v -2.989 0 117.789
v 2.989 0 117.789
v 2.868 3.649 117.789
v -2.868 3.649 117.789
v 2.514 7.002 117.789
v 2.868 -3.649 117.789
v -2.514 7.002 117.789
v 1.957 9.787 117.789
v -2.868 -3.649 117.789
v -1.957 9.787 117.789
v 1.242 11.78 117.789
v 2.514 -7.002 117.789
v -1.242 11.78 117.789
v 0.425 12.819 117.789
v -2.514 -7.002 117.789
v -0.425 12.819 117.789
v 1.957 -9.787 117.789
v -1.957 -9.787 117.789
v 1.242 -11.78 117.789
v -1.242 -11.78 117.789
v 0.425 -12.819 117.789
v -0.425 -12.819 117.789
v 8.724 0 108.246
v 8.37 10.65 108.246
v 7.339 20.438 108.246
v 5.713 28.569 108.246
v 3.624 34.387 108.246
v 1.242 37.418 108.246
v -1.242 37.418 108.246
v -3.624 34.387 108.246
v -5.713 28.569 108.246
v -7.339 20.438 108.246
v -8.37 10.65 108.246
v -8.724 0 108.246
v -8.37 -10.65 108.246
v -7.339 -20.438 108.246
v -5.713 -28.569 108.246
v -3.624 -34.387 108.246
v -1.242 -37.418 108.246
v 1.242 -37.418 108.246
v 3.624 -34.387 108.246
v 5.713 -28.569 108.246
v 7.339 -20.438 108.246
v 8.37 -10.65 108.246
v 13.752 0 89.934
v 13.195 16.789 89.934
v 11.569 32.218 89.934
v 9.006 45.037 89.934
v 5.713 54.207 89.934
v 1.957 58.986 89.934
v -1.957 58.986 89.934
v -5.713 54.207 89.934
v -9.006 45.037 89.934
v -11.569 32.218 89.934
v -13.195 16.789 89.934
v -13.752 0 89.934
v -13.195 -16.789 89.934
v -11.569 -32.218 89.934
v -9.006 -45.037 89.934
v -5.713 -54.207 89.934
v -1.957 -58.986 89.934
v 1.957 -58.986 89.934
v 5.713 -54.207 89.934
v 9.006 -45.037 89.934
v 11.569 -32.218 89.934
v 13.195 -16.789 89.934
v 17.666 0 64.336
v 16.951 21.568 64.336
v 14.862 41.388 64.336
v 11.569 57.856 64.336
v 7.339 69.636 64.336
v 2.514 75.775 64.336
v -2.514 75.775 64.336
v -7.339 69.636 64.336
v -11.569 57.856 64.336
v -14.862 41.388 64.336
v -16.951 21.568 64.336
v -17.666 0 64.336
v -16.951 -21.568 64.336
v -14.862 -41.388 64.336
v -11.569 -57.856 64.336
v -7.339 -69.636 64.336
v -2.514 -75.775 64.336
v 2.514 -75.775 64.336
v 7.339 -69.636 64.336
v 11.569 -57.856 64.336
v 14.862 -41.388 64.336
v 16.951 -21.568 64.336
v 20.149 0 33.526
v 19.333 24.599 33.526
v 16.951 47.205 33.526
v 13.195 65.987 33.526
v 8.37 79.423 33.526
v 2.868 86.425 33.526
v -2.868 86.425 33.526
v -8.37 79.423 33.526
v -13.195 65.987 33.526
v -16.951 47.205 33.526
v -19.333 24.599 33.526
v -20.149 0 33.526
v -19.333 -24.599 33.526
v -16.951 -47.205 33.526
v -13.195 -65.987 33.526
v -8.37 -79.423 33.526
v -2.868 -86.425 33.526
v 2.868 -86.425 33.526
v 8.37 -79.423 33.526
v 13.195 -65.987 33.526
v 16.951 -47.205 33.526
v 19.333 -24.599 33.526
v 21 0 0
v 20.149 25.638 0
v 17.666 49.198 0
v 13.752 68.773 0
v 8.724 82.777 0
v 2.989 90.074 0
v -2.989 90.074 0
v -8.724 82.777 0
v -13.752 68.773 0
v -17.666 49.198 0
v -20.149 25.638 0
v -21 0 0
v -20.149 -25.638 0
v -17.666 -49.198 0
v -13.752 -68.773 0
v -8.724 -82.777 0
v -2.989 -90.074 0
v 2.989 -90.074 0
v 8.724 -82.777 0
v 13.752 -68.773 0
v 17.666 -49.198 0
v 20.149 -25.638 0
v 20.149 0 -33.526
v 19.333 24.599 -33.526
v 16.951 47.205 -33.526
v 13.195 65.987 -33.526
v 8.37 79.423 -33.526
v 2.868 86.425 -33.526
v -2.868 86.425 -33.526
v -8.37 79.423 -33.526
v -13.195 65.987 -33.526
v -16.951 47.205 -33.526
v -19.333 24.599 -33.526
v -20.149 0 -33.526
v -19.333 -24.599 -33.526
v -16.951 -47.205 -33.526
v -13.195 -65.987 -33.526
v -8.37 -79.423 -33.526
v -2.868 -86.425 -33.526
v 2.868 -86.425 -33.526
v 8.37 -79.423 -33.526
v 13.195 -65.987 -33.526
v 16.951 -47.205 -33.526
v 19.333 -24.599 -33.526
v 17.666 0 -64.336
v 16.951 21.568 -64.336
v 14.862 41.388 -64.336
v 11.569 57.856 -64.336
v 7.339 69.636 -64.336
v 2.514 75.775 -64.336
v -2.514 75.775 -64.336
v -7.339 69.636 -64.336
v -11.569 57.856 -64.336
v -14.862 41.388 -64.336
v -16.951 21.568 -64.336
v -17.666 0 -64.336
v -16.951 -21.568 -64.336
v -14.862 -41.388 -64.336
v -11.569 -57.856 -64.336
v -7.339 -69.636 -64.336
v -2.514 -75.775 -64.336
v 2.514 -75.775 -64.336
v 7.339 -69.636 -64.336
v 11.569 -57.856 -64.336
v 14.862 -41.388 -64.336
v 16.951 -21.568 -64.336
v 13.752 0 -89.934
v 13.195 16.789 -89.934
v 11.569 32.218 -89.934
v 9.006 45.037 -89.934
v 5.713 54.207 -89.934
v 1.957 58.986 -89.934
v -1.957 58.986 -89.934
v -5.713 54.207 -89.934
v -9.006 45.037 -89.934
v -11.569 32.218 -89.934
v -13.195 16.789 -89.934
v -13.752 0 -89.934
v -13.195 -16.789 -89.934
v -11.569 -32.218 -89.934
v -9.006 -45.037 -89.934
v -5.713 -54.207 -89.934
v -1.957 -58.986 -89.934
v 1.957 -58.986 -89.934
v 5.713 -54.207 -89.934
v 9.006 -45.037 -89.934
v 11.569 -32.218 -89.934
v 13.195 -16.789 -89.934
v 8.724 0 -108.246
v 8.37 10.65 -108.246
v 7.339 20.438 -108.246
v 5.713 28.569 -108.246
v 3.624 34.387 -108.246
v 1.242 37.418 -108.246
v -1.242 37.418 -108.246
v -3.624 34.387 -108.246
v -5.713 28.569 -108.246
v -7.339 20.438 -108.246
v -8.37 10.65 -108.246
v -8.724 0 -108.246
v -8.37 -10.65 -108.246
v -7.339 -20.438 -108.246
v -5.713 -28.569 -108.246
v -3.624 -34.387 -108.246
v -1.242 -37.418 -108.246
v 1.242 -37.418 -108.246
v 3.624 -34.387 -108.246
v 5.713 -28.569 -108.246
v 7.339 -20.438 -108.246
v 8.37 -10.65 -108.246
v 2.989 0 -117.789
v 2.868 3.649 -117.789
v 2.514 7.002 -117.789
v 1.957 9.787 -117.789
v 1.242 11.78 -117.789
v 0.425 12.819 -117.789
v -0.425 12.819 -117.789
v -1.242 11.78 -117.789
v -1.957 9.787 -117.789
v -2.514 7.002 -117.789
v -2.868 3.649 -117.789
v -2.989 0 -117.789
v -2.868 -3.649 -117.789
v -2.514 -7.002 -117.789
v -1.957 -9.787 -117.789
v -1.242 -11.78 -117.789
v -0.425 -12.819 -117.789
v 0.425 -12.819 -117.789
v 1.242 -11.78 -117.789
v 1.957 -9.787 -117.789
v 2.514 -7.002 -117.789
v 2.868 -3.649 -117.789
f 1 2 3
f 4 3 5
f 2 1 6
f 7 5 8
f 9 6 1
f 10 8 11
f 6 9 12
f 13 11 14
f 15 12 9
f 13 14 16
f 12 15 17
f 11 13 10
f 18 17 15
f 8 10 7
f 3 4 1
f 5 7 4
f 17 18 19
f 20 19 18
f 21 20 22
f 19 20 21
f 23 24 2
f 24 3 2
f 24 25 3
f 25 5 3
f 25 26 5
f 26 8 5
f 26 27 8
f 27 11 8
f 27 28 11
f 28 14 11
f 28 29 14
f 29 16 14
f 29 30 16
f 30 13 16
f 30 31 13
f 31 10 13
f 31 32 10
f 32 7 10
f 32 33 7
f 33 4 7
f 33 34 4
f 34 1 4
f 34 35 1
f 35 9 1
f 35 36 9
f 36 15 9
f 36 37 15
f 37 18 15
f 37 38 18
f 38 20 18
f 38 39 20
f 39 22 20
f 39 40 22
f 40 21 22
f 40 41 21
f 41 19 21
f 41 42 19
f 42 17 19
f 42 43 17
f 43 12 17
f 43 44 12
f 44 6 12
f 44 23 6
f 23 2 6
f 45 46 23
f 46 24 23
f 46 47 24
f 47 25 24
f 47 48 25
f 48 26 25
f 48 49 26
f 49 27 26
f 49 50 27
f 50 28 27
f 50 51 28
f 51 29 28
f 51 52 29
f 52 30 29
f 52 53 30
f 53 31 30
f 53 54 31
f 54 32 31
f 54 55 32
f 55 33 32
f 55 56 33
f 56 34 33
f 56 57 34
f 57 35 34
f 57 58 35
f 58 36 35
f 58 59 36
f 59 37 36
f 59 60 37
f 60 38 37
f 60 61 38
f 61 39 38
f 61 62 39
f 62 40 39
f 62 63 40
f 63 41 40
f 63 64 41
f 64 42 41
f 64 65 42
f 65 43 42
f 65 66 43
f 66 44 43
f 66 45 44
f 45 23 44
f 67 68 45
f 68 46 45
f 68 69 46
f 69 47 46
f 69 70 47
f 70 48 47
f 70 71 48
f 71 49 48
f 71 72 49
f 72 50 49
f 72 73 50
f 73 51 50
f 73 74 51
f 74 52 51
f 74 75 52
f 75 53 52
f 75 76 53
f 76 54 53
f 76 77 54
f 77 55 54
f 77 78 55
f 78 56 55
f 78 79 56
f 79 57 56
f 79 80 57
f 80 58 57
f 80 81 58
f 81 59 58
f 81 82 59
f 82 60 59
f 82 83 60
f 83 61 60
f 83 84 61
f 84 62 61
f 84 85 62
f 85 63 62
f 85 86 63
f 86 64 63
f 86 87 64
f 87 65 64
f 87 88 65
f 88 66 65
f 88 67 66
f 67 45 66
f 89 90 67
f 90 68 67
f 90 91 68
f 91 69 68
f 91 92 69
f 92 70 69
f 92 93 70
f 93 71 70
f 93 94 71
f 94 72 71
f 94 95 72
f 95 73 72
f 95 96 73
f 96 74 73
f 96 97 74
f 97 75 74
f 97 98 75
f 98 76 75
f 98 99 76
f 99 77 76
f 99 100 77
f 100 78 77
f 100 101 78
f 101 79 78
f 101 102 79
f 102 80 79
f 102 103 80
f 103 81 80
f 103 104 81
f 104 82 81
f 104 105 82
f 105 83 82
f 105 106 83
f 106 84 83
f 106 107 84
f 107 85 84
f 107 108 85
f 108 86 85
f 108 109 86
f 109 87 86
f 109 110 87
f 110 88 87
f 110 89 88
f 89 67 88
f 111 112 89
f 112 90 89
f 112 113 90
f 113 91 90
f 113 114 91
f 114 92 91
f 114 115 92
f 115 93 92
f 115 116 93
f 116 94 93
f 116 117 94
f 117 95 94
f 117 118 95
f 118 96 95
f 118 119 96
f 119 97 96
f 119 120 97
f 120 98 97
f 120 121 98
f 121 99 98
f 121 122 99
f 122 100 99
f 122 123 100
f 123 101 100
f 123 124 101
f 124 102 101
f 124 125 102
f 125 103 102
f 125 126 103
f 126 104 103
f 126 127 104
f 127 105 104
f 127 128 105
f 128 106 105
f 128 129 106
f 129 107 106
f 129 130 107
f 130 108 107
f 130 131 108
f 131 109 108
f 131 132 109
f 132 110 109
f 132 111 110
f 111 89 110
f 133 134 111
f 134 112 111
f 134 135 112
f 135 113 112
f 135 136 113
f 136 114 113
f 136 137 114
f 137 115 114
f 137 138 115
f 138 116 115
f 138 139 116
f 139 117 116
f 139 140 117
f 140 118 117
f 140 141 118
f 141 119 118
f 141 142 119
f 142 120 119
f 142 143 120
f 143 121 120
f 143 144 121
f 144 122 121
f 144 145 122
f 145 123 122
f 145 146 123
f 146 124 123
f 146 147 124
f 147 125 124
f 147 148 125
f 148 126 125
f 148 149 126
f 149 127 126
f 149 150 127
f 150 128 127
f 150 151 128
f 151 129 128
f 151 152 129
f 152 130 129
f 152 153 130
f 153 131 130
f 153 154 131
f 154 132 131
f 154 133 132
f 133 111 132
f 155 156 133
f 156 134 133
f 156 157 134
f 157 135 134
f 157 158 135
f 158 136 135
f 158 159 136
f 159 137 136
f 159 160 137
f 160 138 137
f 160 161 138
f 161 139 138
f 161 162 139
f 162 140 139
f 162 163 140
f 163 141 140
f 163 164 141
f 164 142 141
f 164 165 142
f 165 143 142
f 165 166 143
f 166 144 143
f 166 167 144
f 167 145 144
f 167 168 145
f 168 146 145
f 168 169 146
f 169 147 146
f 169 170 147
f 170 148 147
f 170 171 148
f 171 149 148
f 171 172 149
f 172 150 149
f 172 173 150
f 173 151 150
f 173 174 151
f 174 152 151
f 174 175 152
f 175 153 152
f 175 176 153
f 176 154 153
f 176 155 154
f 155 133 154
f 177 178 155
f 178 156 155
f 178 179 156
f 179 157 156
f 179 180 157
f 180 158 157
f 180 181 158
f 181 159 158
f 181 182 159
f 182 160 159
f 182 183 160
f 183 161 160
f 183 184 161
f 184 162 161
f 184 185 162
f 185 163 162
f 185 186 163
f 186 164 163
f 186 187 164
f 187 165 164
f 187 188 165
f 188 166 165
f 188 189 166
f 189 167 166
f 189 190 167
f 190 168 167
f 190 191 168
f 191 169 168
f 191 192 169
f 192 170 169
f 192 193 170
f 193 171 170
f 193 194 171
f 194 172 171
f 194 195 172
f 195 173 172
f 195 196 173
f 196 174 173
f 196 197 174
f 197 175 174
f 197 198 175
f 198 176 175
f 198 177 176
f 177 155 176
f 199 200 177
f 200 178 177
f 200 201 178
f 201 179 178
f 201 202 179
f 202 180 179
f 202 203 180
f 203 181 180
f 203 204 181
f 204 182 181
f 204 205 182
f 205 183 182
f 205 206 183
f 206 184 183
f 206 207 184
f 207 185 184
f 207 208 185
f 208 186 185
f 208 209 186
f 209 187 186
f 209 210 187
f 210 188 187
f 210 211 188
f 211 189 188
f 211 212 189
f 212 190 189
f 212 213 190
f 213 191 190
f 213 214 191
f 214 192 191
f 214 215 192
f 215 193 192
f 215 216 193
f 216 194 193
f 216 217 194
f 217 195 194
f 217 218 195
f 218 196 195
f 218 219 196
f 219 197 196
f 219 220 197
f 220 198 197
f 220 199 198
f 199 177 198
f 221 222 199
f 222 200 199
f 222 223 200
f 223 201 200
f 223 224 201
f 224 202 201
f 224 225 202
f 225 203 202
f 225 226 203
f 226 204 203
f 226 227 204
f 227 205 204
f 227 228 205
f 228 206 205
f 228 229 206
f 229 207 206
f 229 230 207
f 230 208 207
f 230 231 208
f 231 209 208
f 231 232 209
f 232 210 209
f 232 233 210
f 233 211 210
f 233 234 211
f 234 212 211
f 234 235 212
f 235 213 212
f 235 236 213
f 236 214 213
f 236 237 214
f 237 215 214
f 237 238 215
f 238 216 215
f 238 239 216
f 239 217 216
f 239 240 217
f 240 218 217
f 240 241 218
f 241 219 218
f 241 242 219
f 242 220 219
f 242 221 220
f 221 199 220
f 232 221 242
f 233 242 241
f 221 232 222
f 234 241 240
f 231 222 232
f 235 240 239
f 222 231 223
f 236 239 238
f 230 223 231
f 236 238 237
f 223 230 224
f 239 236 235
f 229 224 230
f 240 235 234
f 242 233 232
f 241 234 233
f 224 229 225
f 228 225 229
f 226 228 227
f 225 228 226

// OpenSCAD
// Generated by SolidPython 1.0.1 on 2020-07-29 00:46:45


scale(v = [3, 13, 17]) {
	sphere(r = 7);
}
/***********************************************
*********      SolidPython code:      **********
************************************************
 
# import packages: SolidPython
from solid import *
from solid.utils import *
from itertools import chain, combinations, permutations


class Resize:

    def __init__(self, scad_file):
        self.scad_file = scad_file
        #self.scad_file = import_scad(scad_file)
        # cone/cylinder param:
        self.r1 = 0
        self.r2 = 0
        self.h = 0
        # rectangular prism param:
        self.w = 0
        self.l = 0
        # ellipse param:
        self.r = 0

    # import OpenScad code (file name corresponds to shape)


    # classify shape + parameters
    def assign(self, param1, param2, param3):
        if self.scad_file == 'cone.scad':
            self.r1 = param1
            self.r2 = param2
            self.h = param3
        elif self.scad_file == 'cylinder.scad':
            self.r1 = param1
            self.r2 = param2
            self.h = param3
        elif self.scad_file == 'rectangularPrism.scad':
            self.h = param1
            self.l = param2
            self.w = param3
        else:
            self.r = param1
            self.h = param2

    # resize parameters
    def iterate(self):
        x = range(3, 20, 2)
        i = 1
        if self.scad_file == 'cone.scad':
            tempList = list(permutations(x, 2))
            for temp in tempList:
                param1 = temp[0]
                param2 = temp[1]
                filepath = 'produced_scad_files/' + 'cone' + str(param1) + '_' + str(param2) + '_' + '.scad'
                scad_render_to_file(cylinder(h=param1, r1=param2, r2=0), filepath)

        elif self.scad_file == 'cylinder.scad':
            tempList = list(permutations(x, 3))
            for temp in tempList:
                param1 = temp[0]
                param2 = temp[1]
                filepath = 'produced_scad_files/' + 'cylinder' + str(param1) + '_' + str(param2) + '_' + '.scad'
                scad_render_to_file(cylinder(h=param1, r1=param2, r2=param2), filepath)

        elif self.scad_file == 'rectangularPrism.scad':
            tempList = list(permutations(x, 3))
            for temp in tempList:
                param1 = temp[0]
                param2 = temp[1]
                param3 = temp[2]
                filepath = 'produced_scad_files/' + 'rectangularPrism' + str(param1) + '_' + str(param2) + '_' + str(
                    param3) + '.scad'
                scad_render_to_file(cube(size=(param1, param2, param3)), filepath)

        elif self.scad_file == 'ellipse.scad':
            tempList = list(permutations(x, 4))
            for temp in tempList:
                param1 = temp[0]
                param2 = temp[1]
                param3 = temp[2]
                param4 = temp[3]
                filepath = 'produced_scad_files/' + 'ellipse' + str(param1) + '_' + str(param2) + '_' + str(param3) + '_' + str(param4) + '.scad'
                scad_render_to_file(scale([param1, param2, param3])(sphere(r=param4)), filepath)

    def render_to_scadfile(self):
        scad_render_to_file(scad, 'example.scad') 
 
************************************************/
